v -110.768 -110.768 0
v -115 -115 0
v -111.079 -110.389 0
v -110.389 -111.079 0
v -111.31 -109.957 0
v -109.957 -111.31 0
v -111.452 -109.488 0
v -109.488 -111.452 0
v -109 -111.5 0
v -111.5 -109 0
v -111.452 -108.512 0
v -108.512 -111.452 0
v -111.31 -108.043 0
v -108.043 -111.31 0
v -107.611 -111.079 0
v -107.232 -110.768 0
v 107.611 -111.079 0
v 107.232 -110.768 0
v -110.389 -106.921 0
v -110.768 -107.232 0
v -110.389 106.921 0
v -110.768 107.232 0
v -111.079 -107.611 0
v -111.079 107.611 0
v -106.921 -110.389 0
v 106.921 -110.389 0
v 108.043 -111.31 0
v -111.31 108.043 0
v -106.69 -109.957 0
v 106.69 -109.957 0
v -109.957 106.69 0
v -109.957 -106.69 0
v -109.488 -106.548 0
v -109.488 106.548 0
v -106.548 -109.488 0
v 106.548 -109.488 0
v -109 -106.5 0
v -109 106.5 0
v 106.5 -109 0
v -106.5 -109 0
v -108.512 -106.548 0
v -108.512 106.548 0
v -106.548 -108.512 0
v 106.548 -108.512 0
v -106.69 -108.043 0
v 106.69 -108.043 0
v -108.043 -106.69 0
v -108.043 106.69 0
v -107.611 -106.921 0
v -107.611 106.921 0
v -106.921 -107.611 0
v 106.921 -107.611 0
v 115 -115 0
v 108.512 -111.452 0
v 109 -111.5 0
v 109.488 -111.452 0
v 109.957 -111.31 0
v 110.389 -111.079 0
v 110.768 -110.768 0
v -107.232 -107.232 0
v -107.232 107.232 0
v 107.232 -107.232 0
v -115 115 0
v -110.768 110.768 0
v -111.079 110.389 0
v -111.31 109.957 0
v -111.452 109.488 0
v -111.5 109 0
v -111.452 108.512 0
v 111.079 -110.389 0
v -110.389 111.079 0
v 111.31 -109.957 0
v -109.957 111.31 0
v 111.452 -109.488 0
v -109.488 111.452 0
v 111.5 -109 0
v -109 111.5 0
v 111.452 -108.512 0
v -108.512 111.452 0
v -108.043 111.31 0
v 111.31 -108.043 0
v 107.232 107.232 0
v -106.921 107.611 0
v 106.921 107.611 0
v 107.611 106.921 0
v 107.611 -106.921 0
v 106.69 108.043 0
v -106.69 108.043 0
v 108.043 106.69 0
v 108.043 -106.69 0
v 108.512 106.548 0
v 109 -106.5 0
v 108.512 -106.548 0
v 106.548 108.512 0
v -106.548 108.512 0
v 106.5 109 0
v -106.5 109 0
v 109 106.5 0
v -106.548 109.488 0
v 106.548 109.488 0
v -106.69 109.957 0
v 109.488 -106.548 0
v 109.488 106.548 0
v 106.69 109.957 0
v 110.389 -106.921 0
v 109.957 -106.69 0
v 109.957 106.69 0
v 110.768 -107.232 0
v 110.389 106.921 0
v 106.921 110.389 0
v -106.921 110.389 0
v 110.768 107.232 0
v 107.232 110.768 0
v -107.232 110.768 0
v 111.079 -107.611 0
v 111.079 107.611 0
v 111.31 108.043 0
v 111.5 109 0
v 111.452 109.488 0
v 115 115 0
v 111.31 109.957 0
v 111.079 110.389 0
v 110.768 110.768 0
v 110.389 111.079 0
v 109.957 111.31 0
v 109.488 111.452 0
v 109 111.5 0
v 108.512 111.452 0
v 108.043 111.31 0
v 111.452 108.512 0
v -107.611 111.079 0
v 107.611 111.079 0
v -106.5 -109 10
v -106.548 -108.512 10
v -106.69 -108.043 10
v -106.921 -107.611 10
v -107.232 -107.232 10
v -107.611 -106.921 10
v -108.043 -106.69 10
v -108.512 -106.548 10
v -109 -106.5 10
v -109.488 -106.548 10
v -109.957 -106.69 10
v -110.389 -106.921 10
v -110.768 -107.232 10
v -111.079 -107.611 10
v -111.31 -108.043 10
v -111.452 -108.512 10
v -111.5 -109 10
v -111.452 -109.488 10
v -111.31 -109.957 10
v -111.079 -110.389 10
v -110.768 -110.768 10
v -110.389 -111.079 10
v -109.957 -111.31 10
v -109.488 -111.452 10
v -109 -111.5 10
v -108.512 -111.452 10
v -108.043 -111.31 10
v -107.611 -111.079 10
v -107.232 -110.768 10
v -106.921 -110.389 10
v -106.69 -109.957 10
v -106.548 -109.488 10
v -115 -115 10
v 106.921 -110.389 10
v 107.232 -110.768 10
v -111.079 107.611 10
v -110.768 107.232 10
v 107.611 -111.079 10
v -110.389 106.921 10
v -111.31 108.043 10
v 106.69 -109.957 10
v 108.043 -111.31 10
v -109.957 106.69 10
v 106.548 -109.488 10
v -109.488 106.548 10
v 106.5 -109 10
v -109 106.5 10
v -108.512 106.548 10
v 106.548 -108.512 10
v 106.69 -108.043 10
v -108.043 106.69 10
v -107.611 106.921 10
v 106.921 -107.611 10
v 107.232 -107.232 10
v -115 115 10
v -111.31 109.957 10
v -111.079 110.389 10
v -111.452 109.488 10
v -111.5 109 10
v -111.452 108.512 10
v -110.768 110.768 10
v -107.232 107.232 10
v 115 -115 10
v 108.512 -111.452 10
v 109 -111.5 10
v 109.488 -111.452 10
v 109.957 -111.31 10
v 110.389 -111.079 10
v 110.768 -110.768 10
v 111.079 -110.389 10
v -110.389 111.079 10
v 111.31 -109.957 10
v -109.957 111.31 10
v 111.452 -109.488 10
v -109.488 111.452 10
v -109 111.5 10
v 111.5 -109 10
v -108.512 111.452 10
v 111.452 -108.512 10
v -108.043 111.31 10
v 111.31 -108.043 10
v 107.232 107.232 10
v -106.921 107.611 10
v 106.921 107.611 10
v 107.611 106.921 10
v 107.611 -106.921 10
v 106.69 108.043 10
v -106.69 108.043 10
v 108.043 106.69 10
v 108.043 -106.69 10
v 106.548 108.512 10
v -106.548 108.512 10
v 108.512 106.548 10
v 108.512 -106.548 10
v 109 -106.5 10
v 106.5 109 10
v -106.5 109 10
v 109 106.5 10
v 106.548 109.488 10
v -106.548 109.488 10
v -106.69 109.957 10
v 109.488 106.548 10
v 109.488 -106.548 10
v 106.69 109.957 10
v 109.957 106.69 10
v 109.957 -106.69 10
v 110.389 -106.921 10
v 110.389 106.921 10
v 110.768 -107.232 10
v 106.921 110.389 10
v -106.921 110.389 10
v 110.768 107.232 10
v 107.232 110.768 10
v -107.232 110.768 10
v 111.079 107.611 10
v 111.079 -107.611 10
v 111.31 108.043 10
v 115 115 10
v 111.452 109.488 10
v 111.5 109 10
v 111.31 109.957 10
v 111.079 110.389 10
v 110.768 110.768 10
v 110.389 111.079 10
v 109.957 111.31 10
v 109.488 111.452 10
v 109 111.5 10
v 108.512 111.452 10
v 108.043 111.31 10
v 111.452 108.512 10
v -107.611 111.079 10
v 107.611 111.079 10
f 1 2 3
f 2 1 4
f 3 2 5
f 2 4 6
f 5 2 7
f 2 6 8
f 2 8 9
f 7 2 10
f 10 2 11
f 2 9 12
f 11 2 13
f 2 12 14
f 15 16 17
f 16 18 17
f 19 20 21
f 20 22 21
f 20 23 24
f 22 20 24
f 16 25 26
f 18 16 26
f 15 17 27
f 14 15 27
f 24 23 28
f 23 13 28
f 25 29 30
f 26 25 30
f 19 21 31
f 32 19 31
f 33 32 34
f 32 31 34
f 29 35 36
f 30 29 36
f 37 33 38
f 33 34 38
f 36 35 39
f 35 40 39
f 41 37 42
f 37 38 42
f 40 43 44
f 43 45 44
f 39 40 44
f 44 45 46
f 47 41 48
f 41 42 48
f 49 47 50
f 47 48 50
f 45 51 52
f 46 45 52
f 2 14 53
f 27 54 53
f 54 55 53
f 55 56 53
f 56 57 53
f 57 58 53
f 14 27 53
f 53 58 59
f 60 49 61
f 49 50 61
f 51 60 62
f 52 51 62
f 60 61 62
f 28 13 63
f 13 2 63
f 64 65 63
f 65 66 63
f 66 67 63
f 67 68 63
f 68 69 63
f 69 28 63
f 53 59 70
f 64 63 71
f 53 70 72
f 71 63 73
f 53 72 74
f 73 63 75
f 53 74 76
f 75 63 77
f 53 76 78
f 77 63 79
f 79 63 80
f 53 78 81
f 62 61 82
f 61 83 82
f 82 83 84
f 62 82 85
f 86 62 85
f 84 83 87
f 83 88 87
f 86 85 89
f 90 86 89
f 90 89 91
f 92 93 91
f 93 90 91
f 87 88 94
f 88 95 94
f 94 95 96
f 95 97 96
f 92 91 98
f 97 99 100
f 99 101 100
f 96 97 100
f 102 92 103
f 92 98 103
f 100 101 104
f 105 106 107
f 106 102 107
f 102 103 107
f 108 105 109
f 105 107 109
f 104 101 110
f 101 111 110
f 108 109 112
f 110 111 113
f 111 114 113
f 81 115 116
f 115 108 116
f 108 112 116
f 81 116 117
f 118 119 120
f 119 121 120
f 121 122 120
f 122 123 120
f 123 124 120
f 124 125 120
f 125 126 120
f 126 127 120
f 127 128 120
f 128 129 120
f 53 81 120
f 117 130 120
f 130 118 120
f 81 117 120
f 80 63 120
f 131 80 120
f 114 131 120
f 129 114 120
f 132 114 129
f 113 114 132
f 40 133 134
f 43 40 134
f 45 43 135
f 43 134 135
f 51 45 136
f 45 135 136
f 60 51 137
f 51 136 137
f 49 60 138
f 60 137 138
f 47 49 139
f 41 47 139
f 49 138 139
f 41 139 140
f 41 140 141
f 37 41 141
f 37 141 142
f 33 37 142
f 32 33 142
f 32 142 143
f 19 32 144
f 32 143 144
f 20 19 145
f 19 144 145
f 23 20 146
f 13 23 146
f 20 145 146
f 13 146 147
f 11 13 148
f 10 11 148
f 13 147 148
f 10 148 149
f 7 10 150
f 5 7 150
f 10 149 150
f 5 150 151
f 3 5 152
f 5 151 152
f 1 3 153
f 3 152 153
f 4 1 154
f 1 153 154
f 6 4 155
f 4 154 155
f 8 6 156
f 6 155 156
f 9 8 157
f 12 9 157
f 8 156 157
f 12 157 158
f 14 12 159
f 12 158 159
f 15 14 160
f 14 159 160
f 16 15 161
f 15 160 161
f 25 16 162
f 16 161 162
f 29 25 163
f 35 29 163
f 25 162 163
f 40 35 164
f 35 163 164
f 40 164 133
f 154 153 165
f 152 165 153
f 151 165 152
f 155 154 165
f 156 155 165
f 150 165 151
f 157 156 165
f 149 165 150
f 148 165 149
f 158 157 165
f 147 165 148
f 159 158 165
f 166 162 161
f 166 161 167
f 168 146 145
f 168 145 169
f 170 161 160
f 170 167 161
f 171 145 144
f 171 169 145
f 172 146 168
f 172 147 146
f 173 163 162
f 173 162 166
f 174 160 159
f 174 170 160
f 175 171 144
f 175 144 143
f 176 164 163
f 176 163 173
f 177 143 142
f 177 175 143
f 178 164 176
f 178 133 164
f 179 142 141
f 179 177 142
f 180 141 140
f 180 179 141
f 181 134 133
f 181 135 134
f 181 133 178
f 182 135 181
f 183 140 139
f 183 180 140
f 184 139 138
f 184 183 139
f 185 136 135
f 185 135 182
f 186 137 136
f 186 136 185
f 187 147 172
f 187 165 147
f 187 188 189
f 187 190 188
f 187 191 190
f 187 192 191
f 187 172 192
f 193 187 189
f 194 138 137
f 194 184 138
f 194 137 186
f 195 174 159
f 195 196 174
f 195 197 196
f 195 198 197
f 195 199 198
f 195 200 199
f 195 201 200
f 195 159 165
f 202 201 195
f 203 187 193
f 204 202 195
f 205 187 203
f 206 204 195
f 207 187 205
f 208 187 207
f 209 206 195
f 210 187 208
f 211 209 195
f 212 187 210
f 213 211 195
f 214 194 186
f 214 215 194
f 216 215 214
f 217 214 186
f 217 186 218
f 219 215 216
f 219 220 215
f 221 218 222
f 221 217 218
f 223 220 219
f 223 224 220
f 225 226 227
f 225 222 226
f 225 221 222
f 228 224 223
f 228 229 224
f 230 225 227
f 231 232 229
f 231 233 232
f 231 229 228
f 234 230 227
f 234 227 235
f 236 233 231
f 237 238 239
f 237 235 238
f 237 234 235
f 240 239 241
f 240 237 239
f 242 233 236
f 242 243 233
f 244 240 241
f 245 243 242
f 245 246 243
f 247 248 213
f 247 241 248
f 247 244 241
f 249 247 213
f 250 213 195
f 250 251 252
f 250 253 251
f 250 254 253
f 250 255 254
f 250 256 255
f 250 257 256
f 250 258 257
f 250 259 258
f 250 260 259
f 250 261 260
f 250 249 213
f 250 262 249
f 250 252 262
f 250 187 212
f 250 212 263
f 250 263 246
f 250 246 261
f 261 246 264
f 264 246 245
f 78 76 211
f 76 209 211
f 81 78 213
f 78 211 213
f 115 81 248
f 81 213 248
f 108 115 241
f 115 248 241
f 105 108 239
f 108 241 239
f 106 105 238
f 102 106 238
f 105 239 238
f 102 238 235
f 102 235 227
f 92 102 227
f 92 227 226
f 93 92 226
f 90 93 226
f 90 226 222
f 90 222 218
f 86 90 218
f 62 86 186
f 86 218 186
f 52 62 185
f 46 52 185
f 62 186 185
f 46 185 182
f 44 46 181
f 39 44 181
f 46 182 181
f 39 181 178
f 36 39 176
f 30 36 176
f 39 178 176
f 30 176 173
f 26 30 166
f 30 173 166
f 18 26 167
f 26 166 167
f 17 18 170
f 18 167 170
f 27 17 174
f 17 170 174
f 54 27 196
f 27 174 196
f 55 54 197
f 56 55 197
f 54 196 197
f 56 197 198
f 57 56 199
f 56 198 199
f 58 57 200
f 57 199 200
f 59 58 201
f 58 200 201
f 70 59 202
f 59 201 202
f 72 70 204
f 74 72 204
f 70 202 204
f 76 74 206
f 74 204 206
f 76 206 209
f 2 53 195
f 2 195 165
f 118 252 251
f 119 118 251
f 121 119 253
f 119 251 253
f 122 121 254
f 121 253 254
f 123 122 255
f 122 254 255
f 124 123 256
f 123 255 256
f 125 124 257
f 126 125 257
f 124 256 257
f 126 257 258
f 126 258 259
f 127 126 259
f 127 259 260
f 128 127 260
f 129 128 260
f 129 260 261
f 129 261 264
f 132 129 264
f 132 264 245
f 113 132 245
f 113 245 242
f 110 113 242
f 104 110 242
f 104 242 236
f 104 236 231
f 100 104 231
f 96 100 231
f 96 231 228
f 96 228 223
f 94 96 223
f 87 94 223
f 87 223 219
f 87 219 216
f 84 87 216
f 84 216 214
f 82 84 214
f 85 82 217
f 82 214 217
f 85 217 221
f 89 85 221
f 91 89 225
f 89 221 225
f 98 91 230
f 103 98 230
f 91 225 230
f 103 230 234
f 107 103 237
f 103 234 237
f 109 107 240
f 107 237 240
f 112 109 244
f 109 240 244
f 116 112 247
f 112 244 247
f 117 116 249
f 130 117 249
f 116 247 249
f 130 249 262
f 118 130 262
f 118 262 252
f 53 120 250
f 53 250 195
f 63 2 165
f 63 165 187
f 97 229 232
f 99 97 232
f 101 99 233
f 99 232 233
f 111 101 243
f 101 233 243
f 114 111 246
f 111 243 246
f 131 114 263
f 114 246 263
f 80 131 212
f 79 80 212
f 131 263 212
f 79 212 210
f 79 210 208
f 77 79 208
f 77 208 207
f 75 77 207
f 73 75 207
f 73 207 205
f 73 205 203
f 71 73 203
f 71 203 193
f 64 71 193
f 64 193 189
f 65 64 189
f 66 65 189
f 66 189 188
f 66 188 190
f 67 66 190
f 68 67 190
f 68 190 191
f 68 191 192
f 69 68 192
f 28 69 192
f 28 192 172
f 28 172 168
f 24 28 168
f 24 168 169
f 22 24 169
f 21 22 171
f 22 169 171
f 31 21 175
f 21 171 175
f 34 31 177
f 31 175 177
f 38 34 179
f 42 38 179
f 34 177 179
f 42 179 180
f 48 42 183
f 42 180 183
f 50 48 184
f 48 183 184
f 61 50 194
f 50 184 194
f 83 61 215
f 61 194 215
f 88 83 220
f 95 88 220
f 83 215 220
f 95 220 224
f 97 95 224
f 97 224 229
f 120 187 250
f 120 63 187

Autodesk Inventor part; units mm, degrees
ref_plane "YZ Plane" through (0, 0, 0) normal (1, 0, 0) x (0, 1, 0)
ref_plane "XZ Plane" through (0, 0, 0) normal (0, 1, 0) x (-1, 0, 0)
ref_plane "XY Plane" through (0, 0, 0) normal (0, 0, 1) x (1, 0, 0)
sketch "Sketch1" plane through (0, 0, 0) normal (0, 0, 1) x (1, 0, 0)
  line L0 (-115, 115) -> (115, 115)
  line L1 (115, 115) -> (115, -115)
  line L2 (115, -115) -> (-115, -115)
  line L3 (-115, -115) -> (-115, 115)
  point P0 (0, 0)
  dimension "d0" = 230
  dimension "d1" = 230
  dimension "d2" = 115
  dimension "d3" = 115
extrude "Tykkelsen" add sketch "Sketch1" along normal blind 10
sketch "Sketch2" plane through (0, 0, 10) normal (0, 0, 1) x (1, 0, 0)
  line L0 (115, 115) -> (-115, 115) projected
  line L1 (-115, 115) -> (-115, -115) projected
  line L2 (-115, -115) -> (115, -115) projected
  line L3 (115, -115) -> (115, 115) projected
  circle A0 centre (109, -109) radius 2.5
  circle A1 centre (109, 109) radius 2.5
  circle A2 centre (-109, 109) radius 2.5
  circle A3 centre (-109, -109) radius 2.5
  point P0 (0, 0)
  dimension "d6" = 5
  dimension "d7" = 5
  dimension "d8" = 5
  dimension "d9" = 5
  dimension "d10" = 6
  dimension "d11" = 6
  dimension "d12" = 6
  dimension "d13" = 6
  dimension "d14" = 6
  dimension "d15" = 6
  dimension "d16" = 6
  dimension "d17" = 6
  dimension "d20" = 218
  dimension "d21" = 218
extrude "Monteringshuller" cut sketch "Sketch2" against normal blind 34.5 contours A0 | A1 | A2 | A3
equation "\"d2\" = 0.5 * d1"
equation "\"d3\" = 0.5 * d0"
equation "\"d6\" = d7"
equation "\"d8\" = d7"
equation "\"d9\" = d7"
equation "\"d11\" = d10"
equation "\"d13\" = d12"
equation "\"d14\" = d12"
equation "\"d15\" = d13"
equation "\"d16\" = d10"
equation "\"d17\" = d10"
properties part number "Byggeplade" material "Aluminum 6061"
